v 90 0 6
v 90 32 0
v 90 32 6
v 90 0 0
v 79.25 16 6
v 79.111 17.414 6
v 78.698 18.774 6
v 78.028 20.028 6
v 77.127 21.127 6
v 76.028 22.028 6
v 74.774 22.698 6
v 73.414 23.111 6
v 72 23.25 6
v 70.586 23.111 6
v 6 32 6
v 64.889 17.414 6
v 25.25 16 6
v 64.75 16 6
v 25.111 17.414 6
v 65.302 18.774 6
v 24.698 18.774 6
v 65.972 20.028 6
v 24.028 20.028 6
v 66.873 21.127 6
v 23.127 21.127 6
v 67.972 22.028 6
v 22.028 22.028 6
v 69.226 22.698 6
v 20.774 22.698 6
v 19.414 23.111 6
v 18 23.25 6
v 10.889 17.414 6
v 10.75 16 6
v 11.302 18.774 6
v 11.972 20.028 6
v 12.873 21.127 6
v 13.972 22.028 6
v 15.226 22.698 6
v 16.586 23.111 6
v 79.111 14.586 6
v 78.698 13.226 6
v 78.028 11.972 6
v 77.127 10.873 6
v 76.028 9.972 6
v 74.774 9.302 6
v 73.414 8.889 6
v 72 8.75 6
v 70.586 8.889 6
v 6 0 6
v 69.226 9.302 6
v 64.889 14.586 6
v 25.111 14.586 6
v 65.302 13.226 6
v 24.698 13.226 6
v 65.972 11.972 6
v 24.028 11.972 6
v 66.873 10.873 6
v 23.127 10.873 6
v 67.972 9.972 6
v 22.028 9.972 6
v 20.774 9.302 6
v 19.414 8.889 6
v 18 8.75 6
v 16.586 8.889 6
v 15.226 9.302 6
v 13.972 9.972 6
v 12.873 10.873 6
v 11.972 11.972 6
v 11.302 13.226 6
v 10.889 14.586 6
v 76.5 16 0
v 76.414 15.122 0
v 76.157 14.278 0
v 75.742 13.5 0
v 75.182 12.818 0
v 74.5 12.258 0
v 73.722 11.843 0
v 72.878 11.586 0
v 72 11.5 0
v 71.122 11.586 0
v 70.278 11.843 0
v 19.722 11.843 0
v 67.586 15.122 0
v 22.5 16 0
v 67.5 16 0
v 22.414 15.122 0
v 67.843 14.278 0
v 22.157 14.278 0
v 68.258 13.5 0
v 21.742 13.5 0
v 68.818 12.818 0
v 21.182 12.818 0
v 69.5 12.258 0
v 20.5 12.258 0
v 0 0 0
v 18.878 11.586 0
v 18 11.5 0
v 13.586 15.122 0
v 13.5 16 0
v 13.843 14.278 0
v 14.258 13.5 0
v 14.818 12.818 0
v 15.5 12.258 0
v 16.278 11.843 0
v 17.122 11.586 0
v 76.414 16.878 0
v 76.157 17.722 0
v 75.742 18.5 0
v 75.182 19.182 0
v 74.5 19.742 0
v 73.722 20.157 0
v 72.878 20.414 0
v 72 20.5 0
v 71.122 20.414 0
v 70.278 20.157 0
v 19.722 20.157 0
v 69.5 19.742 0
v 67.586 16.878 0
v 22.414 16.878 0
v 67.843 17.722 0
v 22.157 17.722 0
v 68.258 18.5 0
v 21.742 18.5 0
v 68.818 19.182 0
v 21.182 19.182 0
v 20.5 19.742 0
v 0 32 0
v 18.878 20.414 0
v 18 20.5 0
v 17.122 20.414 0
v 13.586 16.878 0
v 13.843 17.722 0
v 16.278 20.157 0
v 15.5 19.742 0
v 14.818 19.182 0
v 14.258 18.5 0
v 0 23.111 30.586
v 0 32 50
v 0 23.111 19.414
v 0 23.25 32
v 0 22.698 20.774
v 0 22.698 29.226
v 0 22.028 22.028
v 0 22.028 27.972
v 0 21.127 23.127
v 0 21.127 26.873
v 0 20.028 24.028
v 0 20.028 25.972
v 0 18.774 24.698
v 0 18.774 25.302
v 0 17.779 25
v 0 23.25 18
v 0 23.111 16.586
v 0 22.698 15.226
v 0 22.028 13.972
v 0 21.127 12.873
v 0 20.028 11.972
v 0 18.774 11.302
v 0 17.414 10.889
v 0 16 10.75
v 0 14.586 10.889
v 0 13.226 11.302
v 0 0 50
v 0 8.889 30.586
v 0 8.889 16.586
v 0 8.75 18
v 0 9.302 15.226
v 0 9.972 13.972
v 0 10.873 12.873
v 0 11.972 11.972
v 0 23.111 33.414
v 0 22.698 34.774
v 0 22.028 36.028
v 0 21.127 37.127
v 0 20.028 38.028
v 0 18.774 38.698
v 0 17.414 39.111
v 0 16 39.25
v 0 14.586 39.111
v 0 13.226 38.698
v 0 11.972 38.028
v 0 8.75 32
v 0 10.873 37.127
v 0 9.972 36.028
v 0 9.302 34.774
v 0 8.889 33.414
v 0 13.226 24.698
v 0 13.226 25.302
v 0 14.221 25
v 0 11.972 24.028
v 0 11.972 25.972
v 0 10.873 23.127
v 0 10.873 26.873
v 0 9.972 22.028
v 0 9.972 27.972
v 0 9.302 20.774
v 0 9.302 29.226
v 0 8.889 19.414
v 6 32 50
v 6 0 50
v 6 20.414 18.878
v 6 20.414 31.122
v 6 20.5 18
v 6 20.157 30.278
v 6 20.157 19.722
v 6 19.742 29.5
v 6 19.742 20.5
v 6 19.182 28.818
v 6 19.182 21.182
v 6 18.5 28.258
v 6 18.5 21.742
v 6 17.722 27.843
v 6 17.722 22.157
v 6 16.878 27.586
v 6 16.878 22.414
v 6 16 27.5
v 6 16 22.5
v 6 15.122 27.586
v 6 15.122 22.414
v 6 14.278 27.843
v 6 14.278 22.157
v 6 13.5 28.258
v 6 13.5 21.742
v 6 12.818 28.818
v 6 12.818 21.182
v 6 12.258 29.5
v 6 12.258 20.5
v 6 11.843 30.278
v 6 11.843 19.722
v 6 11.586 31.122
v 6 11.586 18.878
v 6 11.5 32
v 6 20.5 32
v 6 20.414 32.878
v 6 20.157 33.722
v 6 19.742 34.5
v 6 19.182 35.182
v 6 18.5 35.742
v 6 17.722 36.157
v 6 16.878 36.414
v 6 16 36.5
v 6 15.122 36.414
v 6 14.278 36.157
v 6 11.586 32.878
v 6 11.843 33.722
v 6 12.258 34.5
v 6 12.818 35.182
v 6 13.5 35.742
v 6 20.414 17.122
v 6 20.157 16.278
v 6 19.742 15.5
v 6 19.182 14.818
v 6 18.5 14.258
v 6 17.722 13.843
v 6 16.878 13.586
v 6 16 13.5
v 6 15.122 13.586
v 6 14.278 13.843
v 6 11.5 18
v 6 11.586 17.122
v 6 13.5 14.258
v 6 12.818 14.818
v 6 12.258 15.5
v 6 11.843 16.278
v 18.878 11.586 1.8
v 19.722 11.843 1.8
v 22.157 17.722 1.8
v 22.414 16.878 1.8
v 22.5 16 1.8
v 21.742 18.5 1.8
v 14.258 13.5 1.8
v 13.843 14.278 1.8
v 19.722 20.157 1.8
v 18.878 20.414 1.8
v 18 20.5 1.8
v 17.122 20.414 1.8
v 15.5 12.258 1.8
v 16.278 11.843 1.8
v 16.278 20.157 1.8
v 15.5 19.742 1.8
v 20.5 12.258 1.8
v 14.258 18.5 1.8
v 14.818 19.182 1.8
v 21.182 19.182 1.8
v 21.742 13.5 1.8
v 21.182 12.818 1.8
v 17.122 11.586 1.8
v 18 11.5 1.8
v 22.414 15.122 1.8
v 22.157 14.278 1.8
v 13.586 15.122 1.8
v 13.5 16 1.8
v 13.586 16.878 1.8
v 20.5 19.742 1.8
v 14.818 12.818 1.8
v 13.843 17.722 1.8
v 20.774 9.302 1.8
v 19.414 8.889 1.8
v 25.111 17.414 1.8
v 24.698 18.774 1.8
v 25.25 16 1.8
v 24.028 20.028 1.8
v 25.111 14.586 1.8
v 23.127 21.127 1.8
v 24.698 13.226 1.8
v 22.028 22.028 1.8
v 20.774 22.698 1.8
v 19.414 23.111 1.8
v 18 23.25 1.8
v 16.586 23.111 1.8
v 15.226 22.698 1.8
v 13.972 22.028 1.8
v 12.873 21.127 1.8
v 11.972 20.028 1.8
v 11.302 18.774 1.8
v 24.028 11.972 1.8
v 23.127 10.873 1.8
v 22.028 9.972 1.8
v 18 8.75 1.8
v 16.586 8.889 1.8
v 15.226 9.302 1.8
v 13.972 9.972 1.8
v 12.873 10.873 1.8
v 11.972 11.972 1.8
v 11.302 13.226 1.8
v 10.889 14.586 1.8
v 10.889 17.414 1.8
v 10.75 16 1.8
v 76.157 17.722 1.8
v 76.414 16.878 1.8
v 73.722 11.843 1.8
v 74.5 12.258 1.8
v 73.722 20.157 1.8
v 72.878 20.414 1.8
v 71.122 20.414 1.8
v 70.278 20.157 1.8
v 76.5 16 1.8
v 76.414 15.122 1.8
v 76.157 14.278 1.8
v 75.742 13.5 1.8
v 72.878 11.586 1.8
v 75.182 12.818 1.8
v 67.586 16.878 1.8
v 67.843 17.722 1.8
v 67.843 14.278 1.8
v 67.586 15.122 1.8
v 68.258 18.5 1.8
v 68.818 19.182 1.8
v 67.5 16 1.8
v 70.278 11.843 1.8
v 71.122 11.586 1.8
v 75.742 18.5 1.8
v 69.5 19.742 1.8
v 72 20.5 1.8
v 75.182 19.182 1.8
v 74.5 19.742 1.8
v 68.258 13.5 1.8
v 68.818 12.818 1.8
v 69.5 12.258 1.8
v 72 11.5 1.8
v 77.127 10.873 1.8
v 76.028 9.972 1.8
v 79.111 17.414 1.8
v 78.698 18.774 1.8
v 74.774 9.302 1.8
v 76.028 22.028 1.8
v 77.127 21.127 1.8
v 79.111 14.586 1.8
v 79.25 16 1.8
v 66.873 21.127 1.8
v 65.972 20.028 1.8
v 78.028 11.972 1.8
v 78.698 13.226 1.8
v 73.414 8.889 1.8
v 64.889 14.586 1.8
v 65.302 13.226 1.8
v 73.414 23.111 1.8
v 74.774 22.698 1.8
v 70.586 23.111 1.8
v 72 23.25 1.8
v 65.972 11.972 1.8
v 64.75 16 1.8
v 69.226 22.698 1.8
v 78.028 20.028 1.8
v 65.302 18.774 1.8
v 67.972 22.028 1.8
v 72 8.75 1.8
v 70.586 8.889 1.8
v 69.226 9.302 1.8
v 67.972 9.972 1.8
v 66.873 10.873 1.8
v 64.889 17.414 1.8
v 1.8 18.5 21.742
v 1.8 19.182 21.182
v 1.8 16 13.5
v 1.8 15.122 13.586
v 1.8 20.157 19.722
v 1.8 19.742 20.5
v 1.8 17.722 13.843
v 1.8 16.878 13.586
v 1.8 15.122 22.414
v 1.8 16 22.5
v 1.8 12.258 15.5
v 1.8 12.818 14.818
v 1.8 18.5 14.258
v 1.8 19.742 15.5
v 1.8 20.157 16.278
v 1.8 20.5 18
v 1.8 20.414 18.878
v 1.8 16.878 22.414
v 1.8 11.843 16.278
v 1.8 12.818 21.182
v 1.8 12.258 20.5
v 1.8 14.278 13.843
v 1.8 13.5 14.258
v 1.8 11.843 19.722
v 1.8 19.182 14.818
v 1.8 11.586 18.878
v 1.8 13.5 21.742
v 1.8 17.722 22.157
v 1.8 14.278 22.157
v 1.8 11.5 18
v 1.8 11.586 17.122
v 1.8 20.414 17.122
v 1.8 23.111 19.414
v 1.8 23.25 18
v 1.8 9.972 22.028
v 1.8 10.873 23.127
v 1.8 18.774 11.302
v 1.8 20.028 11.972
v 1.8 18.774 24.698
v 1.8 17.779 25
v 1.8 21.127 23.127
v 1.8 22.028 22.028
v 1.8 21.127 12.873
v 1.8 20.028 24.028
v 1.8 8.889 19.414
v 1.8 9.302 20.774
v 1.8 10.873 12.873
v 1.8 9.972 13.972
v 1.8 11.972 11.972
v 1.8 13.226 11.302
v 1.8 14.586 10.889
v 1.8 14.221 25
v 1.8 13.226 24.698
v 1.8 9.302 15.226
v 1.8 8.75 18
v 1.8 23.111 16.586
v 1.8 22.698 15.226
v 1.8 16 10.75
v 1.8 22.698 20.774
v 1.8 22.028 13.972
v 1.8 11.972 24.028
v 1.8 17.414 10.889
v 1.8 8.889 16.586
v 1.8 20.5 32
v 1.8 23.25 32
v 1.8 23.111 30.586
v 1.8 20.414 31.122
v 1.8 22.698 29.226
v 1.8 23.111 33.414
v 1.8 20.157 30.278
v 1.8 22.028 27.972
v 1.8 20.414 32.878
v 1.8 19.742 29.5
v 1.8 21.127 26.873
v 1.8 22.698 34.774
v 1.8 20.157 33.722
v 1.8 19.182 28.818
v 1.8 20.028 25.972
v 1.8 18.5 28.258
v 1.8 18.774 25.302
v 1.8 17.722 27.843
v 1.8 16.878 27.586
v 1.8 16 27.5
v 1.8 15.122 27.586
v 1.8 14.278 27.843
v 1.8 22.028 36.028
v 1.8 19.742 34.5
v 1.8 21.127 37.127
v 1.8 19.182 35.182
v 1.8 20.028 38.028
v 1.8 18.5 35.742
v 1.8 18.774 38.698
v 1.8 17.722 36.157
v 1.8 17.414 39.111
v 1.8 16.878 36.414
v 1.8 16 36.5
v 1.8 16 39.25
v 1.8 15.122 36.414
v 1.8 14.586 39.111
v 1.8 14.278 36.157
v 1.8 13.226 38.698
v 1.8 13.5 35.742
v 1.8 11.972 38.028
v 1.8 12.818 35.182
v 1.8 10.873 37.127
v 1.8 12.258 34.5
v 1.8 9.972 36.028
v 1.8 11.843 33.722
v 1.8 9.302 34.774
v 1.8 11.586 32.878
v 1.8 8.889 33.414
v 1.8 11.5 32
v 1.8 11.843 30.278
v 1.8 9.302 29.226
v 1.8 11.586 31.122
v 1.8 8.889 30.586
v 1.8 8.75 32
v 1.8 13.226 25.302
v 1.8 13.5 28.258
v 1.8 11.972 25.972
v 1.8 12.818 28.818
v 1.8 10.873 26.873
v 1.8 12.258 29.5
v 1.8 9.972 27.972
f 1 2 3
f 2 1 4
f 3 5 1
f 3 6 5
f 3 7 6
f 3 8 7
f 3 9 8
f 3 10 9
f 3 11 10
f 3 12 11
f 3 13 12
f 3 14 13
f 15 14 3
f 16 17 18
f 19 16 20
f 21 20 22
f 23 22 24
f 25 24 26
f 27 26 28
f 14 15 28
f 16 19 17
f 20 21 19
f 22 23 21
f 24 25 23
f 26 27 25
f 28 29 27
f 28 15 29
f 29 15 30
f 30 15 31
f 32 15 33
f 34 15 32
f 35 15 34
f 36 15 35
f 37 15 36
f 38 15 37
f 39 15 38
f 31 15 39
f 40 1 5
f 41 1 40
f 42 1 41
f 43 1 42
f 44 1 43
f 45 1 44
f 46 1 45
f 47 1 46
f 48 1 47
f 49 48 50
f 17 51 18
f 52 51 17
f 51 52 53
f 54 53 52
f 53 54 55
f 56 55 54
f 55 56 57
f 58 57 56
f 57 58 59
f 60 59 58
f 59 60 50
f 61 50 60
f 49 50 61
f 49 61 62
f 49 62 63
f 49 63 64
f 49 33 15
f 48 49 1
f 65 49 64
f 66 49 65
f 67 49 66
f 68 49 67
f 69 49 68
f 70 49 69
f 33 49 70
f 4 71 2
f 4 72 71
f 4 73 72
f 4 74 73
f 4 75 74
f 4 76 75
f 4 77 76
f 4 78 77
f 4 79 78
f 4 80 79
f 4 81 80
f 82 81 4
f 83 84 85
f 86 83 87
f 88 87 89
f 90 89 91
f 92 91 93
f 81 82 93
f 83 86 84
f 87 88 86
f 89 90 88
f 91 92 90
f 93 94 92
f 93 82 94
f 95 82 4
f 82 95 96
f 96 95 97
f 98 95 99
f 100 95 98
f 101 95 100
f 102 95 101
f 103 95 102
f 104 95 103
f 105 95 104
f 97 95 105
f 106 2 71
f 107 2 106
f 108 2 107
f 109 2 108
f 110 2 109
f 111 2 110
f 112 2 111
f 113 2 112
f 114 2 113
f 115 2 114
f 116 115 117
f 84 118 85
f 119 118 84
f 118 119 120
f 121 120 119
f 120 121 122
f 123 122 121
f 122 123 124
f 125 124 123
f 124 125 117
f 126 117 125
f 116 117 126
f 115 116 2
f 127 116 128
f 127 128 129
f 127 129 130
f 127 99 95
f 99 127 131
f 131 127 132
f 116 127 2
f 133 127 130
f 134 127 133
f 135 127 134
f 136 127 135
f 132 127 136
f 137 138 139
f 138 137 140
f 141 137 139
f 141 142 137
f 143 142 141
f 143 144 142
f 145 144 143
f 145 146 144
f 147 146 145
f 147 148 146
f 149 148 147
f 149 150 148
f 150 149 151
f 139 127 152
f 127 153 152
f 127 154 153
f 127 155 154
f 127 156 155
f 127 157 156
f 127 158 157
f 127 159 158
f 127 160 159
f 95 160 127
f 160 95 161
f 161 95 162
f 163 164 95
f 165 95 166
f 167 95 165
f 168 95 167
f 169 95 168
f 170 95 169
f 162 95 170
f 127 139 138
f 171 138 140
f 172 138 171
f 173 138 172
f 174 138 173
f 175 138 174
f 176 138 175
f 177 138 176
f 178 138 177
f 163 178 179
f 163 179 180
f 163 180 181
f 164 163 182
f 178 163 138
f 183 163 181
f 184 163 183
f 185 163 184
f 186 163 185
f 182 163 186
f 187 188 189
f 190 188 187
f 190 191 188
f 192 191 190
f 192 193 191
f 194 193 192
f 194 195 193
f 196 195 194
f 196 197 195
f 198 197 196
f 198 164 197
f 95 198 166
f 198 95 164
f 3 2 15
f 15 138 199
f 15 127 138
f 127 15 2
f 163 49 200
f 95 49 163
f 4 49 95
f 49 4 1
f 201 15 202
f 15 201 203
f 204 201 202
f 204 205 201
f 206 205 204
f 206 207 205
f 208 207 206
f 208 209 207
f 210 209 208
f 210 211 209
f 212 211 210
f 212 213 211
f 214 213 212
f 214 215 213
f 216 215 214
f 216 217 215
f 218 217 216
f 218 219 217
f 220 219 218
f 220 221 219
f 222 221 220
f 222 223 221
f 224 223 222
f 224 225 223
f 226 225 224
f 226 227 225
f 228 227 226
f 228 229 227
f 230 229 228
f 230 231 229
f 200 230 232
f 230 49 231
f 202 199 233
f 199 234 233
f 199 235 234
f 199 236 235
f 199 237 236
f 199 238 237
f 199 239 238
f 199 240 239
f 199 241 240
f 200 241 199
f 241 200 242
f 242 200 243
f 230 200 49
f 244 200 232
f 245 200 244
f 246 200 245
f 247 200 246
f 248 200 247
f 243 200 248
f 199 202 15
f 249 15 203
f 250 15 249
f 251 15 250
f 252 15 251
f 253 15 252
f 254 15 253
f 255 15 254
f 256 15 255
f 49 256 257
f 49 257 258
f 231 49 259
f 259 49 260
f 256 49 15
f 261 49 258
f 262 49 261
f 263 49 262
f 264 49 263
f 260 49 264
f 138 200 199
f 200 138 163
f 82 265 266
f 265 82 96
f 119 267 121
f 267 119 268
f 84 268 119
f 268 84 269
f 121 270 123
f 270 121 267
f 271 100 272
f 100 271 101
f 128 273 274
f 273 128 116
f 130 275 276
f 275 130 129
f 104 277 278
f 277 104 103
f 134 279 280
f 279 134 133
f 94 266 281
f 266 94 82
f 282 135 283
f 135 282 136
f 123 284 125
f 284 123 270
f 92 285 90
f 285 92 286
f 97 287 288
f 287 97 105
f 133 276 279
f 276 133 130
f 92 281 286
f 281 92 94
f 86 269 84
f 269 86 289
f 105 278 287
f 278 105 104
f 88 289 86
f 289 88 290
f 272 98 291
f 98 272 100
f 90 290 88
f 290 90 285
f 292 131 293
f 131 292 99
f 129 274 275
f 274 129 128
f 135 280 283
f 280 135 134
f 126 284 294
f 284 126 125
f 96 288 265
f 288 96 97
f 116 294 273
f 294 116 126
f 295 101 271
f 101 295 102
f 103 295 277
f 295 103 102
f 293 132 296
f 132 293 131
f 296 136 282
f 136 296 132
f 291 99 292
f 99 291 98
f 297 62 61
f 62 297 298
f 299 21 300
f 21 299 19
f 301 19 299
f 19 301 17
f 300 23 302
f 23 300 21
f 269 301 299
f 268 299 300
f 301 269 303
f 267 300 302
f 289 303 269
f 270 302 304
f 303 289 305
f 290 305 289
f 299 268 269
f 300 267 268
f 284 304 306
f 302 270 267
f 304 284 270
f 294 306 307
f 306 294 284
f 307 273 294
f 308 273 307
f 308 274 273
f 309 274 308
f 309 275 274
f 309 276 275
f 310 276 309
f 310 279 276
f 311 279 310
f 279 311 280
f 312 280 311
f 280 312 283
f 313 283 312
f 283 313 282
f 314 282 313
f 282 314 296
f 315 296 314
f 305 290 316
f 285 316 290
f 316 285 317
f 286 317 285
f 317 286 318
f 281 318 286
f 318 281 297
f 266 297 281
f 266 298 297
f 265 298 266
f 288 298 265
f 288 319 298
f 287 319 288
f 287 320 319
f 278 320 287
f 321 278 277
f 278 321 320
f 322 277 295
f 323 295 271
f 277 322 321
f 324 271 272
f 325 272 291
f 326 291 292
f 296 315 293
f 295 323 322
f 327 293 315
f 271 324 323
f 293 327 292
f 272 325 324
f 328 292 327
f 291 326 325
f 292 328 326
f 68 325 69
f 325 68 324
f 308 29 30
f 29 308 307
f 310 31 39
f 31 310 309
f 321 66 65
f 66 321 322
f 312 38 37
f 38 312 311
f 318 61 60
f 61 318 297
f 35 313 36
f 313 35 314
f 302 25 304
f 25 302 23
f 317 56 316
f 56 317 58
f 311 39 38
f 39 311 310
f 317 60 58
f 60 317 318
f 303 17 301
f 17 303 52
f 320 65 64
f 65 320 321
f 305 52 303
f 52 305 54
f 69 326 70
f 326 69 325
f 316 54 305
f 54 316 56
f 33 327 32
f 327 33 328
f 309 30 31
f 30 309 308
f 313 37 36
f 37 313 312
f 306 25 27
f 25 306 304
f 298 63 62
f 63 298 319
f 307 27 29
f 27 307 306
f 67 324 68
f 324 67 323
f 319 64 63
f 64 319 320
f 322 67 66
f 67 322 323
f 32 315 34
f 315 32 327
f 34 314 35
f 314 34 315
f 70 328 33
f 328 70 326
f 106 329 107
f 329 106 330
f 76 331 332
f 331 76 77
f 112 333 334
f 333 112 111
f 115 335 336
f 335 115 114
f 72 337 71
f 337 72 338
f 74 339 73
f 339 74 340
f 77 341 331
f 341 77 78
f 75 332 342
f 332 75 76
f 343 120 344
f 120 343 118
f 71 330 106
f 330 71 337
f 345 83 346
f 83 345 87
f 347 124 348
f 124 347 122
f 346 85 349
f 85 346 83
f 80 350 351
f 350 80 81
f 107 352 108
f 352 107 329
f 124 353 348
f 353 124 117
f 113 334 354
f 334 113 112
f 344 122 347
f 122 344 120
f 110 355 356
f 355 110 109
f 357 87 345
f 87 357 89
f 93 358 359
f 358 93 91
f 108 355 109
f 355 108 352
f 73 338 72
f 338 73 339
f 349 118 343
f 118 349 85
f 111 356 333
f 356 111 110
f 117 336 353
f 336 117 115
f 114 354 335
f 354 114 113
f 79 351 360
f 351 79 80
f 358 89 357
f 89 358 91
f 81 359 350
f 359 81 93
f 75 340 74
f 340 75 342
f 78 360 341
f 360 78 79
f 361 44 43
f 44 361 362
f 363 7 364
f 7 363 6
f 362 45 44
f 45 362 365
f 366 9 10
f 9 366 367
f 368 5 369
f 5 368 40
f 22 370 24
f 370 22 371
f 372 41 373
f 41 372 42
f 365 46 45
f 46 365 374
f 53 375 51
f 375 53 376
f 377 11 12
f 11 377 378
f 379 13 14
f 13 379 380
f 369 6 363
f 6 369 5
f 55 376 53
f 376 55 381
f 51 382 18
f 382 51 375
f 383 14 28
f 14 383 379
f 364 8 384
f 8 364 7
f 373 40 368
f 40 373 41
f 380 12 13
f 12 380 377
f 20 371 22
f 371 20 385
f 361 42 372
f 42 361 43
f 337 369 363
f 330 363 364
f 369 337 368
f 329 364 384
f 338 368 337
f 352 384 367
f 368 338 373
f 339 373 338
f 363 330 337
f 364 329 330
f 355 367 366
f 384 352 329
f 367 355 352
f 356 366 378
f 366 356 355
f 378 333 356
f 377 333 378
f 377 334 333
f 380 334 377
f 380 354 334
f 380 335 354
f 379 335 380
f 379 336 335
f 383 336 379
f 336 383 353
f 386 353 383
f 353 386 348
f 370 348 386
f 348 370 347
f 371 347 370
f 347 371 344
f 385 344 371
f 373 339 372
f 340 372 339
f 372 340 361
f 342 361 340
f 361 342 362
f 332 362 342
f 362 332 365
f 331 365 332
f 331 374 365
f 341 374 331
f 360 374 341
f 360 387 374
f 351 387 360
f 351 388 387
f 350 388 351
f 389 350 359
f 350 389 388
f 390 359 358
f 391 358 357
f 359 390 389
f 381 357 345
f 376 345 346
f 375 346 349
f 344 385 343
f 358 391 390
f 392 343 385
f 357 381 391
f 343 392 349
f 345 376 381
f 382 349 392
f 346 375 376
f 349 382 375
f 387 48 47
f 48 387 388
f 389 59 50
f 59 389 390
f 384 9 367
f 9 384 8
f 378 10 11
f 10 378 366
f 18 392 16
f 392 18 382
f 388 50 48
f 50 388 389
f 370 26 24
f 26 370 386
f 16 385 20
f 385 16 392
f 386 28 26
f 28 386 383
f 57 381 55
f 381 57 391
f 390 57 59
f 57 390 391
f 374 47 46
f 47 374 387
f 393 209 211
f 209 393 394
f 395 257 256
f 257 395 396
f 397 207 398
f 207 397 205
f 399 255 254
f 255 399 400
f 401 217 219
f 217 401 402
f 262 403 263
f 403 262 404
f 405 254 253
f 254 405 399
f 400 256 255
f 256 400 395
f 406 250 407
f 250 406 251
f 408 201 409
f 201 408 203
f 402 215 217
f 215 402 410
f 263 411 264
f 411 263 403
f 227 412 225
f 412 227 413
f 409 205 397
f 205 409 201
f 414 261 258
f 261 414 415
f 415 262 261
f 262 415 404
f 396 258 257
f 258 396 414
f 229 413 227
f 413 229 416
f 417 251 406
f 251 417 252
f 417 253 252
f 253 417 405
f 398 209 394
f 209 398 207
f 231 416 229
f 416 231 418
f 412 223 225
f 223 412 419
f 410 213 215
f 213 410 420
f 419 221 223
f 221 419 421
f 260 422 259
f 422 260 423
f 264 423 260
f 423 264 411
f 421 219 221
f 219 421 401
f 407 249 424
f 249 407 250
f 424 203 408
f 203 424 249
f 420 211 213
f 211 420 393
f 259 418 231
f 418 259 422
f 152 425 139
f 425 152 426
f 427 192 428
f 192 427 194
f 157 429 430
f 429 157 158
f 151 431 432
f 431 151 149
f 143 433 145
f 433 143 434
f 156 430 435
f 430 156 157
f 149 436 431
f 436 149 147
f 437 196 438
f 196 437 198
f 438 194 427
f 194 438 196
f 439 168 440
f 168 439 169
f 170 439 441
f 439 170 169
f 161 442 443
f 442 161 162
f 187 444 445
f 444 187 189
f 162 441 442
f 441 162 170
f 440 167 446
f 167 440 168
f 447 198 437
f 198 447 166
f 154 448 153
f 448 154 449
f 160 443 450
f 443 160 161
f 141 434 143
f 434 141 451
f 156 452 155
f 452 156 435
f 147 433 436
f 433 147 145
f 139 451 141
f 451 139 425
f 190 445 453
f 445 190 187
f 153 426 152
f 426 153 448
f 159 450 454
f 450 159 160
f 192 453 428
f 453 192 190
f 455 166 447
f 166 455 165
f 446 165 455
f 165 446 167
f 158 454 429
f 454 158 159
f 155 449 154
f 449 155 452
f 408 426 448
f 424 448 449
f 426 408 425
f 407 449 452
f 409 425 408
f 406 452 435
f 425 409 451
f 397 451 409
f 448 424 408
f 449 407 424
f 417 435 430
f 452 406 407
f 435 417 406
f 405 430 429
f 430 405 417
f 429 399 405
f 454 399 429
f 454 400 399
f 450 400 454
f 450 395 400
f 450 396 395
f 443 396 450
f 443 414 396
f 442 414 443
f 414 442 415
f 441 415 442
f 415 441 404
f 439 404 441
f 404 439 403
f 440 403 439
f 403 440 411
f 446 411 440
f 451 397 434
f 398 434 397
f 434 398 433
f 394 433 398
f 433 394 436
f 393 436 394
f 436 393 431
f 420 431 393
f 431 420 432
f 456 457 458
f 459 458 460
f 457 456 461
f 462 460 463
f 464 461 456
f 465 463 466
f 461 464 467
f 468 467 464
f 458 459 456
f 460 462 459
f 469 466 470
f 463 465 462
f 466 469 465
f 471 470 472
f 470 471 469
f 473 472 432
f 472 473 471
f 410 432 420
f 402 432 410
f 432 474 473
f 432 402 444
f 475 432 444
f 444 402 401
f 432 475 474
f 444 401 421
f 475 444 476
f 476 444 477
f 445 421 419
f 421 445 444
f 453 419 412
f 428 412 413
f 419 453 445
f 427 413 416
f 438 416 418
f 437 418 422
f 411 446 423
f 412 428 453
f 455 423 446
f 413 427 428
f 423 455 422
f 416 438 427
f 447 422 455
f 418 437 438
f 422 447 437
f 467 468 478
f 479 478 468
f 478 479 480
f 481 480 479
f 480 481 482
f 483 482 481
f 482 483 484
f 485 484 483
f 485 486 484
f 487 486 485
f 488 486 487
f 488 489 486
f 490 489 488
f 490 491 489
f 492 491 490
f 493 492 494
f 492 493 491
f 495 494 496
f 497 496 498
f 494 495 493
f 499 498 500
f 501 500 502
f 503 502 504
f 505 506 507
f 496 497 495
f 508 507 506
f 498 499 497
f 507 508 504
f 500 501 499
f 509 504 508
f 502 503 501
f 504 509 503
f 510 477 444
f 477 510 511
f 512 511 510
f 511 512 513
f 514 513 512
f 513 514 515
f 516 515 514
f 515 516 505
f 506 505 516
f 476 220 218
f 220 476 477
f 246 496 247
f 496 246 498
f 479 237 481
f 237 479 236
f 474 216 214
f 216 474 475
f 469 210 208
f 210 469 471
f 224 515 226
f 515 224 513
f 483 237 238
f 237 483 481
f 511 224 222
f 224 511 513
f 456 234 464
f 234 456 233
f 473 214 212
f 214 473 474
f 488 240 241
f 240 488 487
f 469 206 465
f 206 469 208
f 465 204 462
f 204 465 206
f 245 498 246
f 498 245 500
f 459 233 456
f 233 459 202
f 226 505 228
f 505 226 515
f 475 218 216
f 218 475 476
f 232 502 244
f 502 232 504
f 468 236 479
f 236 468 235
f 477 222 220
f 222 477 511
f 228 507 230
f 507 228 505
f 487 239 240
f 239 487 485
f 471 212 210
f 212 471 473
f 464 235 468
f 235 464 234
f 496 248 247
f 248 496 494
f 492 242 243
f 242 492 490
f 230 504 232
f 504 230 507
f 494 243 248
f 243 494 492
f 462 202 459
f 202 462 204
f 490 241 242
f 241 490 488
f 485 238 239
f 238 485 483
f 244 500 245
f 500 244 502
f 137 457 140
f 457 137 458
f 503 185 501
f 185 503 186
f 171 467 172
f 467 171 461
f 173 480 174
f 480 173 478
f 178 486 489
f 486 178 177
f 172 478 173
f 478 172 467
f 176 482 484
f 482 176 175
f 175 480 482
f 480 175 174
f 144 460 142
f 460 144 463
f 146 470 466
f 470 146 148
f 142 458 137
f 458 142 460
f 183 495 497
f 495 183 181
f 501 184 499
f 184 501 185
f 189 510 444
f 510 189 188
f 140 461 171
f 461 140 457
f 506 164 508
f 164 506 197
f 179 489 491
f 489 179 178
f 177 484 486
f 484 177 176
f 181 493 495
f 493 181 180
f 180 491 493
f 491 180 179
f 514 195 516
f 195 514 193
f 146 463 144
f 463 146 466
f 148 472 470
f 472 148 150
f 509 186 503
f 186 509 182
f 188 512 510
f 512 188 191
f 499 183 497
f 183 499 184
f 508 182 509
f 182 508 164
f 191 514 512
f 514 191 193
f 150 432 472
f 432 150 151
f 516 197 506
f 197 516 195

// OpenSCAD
$fn = 32;

// ----------------------------------------------------------------------
// L-bracket: 90 x 32 x 50 mm
// ----------------------------------------------------------------------

// --- parameters (mm) ---
base_len = 90;            // horizontal leg, X
upright_h = 50;           // vertical leg, Z
flange_w = 32;            // bracket depth, Y
mat_t = 6;                // plate thickness
hole_d = 9;               // clearance for M8
cb_d = 14.5;              // counterbore seat
cb_h = 4.2;               // counterbore depth

module hole_z(px, py) {
  translate([px, py, -0.5]) cylinder(h = mat_t + 1, d = hole_d);
}
module hole_x(pz, py) {
  translate([-0.5, py, pz]) rotate([0, 90, 0]) cylinder(h = mat_t + 1, d = hole_d);
}
module cb_z(px, py) {
  translate([px, py, mat_t - cb_h]) cylinder(h = cb_h + 0.4, d = cb_d);
}
module cb_x(pz, py) {
  translate([mat_t - cb_h, py, pz]) rotate([0, -90, 0]) cylinder(h = cb_h + 0.4, d = cb_d);
}

difference() {
  union() {
    /* horizontal leg */
    cube([base_len, flange_w, mat_t]);
    /* vertical leg, overlapping the corner block */
    cube([mat_t, flange_w, upright_h]);
  }
  hole_z(18, 16);
  cb_z(18, 16);
  hole_z(72, 16);
  cb_z(72, 16);
  hole_x(18, 16);
  cb_x(18, 16);
  hole_x(32, 16);
  cb_x(32, 16);
}
